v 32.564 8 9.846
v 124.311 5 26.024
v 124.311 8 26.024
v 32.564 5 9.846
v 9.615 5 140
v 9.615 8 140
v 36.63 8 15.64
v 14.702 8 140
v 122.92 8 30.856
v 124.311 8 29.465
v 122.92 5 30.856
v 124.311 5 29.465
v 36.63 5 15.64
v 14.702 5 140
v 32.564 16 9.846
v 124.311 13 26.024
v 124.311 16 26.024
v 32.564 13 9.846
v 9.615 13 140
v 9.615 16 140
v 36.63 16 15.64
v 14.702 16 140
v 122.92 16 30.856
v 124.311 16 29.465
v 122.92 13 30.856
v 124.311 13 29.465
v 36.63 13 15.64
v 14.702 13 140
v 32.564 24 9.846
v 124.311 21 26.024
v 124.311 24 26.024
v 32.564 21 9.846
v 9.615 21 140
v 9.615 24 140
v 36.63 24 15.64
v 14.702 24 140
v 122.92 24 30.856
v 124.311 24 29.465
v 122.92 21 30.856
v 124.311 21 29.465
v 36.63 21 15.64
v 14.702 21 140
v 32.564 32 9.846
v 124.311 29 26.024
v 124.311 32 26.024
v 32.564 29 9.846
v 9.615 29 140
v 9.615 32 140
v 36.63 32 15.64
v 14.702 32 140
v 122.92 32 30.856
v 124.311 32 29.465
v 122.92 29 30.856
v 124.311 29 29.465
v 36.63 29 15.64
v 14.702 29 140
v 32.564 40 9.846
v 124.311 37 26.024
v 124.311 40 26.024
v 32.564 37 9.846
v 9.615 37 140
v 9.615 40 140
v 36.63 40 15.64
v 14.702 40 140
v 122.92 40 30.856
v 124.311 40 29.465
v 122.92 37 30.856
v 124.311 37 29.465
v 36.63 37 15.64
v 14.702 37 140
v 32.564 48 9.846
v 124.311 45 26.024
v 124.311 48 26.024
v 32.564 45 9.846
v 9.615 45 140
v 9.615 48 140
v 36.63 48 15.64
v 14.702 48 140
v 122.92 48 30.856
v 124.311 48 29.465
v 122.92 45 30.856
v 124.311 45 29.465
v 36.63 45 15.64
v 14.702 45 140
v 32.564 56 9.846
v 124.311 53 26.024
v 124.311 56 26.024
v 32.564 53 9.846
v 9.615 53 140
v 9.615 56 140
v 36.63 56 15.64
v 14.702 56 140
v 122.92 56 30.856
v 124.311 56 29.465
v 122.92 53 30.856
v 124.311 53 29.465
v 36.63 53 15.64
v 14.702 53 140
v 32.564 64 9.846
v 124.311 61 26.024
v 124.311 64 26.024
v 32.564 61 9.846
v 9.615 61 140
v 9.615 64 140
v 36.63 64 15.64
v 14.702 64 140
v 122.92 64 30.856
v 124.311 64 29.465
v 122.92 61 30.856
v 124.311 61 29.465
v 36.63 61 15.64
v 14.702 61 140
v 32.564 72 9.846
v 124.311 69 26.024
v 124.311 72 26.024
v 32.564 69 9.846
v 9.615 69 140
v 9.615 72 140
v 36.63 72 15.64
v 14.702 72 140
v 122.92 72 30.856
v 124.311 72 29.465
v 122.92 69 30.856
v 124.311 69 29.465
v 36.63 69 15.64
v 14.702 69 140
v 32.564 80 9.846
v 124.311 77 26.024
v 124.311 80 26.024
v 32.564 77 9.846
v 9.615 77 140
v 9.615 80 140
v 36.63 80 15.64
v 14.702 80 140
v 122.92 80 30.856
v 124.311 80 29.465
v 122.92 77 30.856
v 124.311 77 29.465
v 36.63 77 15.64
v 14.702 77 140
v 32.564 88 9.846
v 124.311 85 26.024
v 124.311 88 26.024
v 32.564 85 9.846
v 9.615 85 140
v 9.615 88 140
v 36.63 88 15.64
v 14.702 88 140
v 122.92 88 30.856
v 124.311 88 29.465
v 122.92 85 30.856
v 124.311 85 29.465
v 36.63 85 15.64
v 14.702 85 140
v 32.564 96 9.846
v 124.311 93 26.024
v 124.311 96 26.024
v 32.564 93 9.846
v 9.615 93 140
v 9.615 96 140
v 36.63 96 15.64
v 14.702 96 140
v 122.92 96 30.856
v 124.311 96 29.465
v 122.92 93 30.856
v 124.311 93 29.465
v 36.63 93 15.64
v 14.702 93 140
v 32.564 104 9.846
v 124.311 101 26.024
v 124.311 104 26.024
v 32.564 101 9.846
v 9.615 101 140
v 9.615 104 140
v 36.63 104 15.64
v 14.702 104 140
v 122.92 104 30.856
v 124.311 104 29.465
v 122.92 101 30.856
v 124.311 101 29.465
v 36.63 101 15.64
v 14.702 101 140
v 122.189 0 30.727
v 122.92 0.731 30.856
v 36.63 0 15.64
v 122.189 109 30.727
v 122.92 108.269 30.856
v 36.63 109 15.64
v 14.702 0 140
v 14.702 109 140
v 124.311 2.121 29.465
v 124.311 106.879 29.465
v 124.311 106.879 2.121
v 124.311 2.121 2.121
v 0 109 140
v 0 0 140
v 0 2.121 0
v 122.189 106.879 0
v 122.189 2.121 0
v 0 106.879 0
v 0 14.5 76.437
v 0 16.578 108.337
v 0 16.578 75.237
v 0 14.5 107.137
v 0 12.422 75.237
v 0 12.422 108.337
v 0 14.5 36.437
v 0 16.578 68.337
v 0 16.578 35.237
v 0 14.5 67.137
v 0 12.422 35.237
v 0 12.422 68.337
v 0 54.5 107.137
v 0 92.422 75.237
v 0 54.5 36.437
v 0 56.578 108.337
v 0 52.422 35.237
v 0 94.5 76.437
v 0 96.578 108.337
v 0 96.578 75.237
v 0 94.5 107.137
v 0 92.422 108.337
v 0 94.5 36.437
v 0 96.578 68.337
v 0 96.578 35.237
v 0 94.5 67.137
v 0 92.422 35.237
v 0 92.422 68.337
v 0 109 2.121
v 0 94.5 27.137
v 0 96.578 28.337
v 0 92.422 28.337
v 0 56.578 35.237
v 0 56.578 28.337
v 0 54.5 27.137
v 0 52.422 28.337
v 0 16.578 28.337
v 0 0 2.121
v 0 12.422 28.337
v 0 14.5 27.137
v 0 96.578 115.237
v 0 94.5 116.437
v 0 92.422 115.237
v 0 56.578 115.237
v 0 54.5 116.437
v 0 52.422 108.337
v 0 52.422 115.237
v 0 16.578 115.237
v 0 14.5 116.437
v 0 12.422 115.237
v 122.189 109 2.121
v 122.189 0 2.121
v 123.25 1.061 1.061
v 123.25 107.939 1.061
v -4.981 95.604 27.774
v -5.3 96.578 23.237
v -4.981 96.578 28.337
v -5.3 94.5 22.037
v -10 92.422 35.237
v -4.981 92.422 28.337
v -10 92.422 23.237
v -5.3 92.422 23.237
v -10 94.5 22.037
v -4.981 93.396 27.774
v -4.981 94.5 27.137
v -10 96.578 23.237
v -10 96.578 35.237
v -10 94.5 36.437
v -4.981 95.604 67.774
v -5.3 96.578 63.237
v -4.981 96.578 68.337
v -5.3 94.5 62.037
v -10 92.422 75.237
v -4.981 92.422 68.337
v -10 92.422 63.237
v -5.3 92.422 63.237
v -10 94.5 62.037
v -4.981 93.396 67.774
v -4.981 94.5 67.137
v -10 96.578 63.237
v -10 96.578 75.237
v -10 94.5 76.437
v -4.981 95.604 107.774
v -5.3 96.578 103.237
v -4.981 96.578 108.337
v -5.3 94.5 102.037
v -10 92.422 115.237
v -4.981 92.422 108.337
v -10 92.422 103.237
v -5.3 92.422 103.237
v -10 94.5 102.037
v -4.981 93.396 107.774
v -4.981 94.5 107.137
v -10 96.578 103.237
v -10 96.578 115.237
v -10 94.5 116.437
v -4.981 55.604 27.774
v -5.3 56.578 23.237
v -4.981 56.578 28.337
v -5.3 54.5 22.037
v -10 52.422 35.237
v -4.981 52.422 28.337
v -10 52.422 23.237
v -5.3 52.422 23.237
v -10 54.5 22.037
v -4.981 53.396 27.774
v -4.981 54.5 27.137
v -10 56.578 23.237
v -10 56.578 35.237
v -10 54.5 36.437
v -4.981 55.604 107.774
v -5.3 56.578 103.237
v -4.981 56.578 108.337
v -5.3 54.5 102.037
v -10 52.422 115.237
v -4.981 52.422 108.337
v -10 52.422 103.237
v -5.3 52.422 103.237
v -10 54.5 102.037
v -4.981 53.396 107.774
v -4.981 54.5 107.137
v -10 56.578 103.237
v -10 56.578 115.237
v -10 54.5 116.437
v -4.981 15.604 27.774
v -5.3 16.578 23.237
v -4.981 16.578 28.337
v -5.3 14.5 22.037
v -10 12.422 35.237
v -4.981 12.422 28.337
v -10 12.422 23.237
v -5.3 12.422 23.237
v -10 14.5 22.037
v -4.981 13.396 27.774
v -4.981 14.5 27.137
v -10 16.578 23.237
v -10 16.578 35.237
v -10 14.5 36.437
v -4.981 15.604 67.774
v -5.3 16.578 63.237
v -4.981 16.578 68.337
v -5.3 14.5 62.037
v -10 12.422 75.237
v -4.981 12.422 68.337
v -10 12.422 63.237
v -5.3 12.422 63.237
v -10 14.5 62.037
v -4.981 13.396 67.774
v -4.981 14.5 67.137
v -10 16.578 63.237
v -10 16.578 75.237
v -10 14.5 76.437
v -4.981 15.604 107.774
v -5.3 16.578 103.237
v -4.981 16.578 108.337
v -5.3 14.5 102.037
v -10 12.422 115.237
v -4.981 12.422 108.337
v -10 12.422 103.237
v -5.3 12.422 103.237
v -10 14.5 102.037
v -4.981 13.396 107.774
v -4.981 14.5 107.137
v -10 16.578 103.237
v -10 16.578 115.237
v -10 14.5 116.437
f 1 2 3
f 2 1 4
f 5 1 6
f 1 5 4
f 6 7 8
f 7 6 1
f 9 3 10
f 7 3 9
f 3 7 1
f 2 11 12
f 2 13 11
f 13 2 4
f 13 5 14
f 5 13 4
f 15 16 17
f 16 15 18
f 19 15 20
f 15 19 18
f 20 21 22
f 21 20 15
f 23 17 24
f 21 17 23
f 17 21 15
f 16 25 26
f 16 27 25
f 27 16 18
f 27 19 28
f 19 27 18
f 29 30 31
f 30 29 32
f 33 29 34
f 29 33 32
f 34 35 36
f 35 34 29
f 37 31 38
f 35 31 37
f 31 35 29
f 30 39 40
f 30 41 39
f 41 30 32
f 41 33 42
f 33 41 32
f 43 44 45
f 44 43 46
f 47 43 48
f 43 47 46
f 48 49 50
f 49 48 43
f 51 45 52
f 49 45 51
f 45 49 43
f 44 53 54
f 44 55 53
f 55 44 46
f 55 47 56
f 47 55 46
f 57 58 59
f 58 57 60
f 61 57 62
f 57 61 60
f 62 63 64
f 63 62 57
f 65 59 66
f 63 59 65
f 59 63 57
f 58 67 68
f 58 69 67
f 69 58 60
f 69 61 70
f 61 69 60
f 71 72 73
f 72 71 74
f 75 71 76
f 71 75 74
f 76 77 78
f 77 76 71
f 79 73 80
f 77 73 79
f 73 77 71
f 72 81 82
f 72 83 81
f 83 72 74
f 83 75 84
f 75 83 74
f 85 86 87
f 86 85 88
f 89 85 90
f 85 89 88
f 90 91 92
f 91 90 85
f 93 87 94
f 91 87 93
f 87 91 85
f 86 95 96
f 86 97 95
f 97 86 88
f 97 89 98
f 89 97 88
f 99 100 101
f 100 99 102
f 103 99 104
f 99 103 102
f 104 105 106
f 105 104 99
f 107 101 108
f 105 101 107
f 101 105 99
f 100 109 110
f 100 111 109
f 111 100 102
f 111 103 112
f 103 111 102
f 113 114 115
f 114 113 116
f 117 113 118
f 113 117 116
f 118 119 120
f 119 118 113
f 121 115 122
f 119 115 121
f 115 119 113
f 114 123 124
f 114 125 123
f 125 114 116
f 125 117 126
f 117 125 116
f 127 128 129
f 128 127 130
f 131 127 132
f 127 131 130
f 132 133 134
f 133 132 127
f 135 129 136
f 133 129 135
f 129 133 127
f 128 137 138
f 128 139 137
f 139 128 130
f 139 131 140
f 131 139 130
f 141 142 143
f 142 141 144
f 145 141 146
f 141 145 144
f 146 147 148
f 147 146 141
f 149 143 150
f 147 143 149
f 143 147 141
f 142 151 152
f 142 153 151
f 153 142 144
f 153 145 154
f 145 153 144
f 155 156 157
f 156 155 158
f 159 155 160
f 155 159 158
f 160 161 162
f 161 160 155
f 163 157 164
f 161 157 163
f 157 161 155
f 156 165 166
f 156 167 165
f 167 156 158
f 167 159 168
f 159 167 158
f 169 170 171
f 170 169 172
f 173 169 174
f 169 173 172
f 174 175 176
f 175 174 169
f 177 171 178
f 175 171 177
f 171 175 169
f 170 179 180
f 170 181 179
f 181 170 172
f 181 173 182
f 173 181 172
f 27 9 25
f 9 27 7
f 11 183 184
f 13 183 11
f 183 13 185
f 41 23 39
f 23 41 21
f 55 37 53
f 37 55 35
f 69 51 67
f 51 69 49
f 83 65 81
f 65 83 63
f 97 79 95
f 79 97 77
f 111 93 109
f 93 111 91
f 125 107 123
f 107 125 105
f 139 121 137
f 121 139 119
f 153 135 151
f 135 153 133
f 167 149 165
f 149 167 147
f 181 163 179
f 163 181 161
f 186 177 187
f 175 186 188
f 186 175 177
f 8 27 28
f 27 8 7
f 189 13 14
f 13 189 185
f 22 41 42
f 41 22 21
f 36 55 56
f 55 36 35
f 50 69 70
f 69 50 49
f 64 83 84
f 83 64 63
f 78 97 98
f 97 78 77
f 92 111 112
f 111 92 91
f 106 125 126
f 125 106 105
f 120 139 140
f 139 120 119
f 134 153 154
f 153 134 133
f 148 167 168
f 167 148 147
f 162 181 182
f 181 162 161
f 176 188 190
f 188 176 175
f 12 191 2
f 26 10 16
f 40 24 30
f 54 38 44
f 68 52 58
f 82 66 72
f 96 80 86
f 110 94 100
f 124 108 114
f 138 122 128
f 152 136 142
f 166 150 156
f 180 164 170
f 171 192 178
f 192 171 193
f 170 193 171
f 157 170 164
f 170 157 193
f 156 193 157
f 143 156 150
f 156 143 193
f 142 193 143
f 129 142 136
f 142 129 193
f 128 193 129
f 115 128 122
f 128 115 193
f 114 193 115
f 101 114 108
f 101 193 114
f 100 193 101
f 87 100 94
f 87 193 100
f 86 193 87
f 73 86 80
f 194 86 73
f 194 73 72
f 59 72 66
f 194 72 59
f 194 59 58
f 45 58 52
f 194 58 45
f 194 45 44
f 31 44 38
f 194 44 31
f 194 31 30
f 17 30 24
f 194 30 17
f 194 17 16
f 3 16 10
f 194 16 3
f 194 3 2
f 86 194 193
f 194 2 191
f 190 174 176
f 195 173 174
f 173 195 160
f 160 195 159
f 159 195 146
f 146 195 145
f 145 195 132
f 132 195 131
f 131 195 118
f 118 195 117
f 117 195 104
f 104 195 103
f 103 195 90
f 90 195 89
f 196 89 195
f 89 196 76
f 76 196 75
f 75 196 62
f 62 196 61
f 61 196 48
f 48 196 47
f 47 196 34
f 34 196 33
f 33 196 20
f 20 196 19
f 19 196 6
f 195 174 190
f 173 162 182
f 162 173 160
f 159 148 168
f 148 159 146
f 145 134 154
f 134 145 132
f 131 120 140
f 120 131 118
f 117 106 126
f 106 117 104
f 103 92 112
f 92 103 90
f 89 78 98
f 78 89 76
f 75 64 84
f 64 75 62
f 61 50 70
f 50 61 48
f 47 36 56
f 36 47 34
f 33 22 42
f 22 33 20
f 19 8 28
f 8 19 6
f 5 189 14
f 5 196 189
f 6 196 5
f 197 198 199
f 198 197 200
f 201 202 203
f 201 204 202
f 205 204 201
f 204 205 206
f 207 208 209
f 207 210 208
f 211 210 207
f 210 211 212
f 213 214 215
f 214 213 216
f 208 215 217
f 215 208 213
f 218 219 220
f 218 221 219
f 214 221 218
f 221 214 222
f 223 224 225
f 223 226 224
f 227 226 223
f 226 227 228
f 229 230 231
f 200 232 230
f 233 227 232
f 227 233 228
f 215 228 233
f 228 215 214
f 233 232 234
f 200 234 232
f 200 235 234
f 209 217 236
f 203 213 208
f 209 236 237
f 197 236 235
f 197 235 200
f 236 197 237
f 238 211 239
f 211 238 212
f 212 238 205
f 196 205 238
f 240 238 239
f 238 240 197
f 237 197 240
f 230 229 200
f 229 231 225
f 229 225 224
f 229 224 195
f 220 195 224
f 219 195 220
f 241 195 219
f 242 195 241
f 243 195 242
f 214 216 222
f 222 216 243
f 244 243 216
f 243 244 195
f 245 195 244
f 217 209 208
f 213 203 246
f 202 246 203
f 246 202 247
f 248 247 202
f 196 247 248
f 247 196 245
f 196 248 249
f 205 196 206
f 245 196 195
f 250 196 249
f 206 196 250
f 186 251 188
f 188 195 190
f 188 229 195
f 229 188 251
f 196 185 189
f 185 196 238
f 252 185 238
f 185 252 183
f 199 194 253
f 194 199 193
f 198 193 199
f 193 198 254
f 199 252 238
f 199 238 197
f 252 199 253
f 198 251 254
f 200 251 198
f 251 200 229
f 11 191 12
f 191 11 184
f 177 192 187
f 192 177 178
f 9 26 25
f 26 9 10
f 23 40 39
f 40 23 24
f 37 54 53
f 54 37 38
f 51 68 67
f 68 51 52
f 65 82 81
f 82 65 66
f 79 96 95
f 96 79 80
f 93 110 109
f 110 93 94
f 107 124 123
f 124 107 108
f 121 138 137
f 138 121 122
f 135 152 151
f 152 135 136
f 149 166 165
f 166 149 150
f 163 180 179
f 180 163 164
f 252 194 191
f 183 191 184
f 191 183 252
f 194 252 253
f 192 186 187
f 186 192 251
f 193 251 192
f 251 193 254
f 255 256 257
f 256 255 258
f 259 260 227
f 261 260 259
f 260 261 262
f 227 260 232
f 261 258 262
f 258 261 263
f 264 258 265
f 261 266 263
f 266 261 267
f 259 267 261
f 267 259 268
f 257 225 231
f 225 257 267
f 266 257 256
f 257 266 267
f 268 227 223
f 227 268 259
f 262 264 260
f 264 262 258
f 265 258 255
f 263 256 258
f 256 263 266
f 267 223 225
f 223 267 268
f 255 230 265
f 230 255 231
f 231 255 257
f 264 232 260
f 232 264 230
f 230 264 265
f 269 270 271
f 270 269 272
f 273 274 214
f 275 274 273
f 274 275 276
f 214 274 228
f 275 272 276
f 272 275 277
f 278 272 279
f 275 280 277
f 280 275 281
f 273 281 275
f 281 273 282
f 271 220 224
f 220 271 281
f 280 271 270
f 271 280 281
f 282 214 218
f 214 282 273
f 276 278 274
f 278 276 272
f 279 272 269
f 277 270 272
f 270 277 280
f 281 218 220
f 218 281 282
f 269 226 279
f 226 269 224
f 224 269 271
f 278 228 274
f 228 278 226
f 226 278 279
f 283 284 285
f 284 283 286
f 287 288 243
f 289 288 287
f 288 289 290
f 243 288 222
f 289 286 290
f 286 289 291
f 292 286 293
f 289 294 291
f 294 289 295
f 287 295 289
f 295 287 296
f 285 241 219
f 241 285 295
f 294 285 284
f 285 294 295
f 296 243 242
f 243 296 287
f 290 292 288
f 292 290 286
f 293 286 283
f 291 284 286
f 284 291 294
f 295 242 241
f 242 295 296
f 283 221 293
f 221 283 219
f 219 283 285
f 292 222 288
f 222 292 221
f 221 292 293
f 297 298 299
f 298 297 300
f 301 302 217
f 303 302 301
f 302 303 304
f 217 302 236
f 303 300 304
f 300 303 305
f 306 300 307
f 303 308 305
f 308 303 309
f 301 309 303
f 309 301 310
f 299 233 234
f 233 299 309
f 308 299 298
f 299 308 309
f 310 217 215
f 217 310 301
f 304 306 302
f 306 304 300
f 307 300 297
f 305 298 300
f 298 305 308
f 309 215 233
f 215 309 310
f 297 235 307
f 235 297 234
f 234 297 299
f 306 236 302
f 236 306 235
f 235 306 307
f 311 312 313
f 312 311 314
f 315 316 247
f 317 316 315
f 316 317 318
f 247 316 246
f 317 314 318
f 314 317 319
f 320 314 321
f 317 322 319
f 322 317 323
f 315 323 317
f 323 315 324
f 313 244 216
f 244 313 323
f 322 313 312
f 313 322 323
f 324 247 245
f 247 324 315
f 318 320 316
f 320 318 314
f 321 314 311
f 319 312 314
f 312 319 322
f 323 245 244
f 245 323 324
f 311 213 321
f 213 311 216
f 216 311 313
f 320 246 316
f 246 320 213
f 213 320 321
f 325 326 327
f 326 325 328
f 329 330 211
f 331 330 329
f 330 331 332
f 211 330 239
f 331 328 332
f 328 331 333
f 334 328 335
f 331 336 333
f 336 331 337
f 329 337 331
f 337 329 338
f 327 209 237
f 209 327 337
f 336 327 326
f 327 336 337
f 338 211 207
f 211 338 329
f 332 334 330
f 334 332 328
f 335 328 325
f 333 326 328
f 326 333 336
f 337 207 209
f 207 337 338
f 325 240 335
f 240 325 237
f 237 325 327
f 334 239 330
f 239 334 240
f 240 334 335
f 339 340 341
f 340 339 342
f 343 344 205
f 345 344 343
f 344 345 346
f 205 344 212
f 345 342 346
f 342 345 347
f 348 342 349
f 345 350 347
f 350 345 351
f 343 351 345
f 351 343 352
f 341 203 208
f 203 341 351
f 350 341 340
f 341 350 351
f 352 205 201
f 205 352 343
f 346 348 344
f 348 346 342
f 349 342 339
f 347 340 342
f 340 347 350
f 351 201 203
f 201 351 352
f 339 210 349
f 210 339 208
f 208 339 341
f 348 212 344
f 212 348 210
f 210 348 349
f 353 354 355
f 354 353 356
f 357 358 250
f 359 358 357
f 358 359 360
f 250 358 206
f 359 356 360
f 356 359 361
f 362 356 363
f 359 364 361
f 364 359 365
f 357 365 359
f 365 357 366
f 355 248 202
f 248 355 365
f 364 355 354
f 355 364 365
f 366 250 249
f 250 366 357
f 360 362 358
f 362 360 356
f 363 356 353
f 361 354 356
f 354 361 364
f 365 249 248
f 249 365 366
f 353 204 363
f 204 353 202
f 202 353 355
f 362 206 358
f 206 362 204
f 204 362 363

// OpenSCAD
// SKADIS PCB Holder

SLOTS = 13;
SLOT_WIDTH = 3;
SLOT_SPACING = 5;
SLOT_DEPTH = 5;
HEIGHT = 140;
DEPTH = 100;
WALL = 10;
ANGLE = 10;

tiny = 0.01;

aoffset = sin(ANGLE) * HEIGHT;
boffset = cos(ANGLE) * HEIGHT; 
echo(aoffset, boffset);

w = SLOTS * (SLOT_WIDTH + SLOT_SPACING) + SLOT_SPACING;

difference() {
  d = DEPTH+aoffset;
  fh=WALL+sin(ANGLE)*d;
  // Body
  cube([d, w, HEIGHT]);
  // Bottom front chamfer
  translate([d,w/2,0]) rotate([0,45,0]) cube([3, w+2*tiny, 3], center=true);
  // Bottom left chamfer
  translate([d/2,0,0]) rotate([45,0,0]) cube([d+2*tiny,3,3], center=true);
  // Bottom rightchamfer
  translate([d/2,w,0]) rotate([45,0,0]) cube([d+2*tiny,3,3], center=true);
  // Front chamfer
  translate([d,w/2,fh]) rotate([0,45,0]) cube([3, w+2*tiny, 3], center=true);
  // Front left chamfer
  translate([d,0,fh/2]) rotate([0,0,45]) cube([3,3, fh+tiny], center=true);
  // Front right chamfer
  translate([d,w,fh/2]) rotate([0,0,45]) cube([3,3, fh+tiny], center=true);
  
  // Slots and body mask
  translate([WALL + aoffset,0,0]) rotate([0,-ANGLE,0]) {
    translate([SLOT_DEPTH,-tiny,WALL+SLOT_DEPTH]) cube([DEPTH+aoffset+2*tiny,w+2*tiny,HEIGHT]);
    // Slots
    for (s=[0:1:SLOTS-1]) {
      // Slot
      translate([-tiny, SLOT_SPACING + s * (SLOT_SPACING + SLOT_WIDTH), WALL]) cube([DEPTH+2*tiny, SLOT_WIDTH, HEIGHT]);
    }
  }
}

translate([0,w,0]) rotate([0,0,-90]) hooks(w, boffset, "edge", 10);

//translate([aoffset,0,0]) rotate([0,-ANGLE,0]) {
//  // Bottom
//  SlottedPlate(DEPTH, w);
//  // Upright
//  rotate([0,90,0]) translate([-HEIGHT,0,0]) SlottedPlate(HEIGHT, w);
//}
//
//// Body
//translate([0,w,0]) rotate([90,0,0]) linear_extrude(w) polygon([
//  [0,0], [0,boffset], [aoffset,0]
//]);
//
//translate([0,w,0]) rotate([0,0,-90]) hooks(w, boffset, "edge", 10);

module SlottedPlate(x,y) {
  difference() {
    cube([x, y, WALL + SLOT_DEPTH]);
    for (s=[0:1:SLOTS-1]) {
      translate([-tiny, SLOT_SPACING + s * (SLOT_SPACING + SLOT_WIDTH), WALL]) cube([x+2*tiny, SLOT_WIDTH, SLOT_DEPTH+tiny]);
    }
  }
}

module hooks(x, y, mode="all", min_edge=10) {
  hook_width = 5;
  hook_height = 15;
  cols = floor((x - 2*min_edge - hook_width)/20)+1;
  offsetX = (x - ((cols-1)*20)) / 2;
  echo("cols", cols)
  echo("offsetX", offsetX);

  rows = floor((y - 2*min_edge)/40)+1;
  offsetY = (hook_height/2) + (y - ((rows)*40)) / 2;
  echo("rows", rows)
  echo("offsetY", offsetY);

  translate([offsetX, 0, offsetY])
  for (col = [0:1:cols-1]) {
    for (row = [0:1:rows-1]) {
      inbetween_offset = col % 2 ? 0 : 20;
      is_bottom_row = col % 2 == 0 ? row == 0 : row == 1;
      if (mode == "all" ||
         (mode == "edge" && (
            col == 0 || // Left
            row == 0 || // Bottom
            col == cols-1 || // Right
            (col % 2 == 0 ? row == rows-1 : false)))
        ) {
        //color(is_bottom_row ? "red" : "black")
        if (inbetween_offset + row * 40 > 0)
          translate([col * 20, 0, inbetween_offset + row * 40]) hook();
      }
    }
  }
}

module hook() {
  // t is the amount we reduce the width/height by to let it fit ok
  t = 0.1;
  // w = width
  w = 5;
  // wt is the width less the t
  wt = w - t * 2;
  // h is the height less a bit to make it fit
  h = 15 - 0.3;
  // h2 is the height of the smaller part of the peg
  h2 = h - 5;
  // ht is the height less t
  ht = h - t;
  // d is the depth of the board
  d = 5;
  // 6 gives us enough facets to create a easy to print angle
  // 4 gives us 45 degrees
  $fn = 6;

  translate([0, -d*2, -wt/2]) rotate([270, 90,0]) union() {
    // The larger part of the peg
    hull() {
      cylinder(d=wt, h=d + 0.3);
      // -0.3 is the taper applied to the face that makes contact with the back on the pegboard
      translate([ht-w, 0, 0]) cylinder(d=wt, h=d -0.3);
    }
    // The smaller part of the peg
    translate([0, 0, 0]) hull() {
      cylinder(d=wt, h = d * 2);
      translate([h2 - w - t * 2 ,0 ,0]) cylinder(d=wt, h=d * 2);
      };
  }
}
